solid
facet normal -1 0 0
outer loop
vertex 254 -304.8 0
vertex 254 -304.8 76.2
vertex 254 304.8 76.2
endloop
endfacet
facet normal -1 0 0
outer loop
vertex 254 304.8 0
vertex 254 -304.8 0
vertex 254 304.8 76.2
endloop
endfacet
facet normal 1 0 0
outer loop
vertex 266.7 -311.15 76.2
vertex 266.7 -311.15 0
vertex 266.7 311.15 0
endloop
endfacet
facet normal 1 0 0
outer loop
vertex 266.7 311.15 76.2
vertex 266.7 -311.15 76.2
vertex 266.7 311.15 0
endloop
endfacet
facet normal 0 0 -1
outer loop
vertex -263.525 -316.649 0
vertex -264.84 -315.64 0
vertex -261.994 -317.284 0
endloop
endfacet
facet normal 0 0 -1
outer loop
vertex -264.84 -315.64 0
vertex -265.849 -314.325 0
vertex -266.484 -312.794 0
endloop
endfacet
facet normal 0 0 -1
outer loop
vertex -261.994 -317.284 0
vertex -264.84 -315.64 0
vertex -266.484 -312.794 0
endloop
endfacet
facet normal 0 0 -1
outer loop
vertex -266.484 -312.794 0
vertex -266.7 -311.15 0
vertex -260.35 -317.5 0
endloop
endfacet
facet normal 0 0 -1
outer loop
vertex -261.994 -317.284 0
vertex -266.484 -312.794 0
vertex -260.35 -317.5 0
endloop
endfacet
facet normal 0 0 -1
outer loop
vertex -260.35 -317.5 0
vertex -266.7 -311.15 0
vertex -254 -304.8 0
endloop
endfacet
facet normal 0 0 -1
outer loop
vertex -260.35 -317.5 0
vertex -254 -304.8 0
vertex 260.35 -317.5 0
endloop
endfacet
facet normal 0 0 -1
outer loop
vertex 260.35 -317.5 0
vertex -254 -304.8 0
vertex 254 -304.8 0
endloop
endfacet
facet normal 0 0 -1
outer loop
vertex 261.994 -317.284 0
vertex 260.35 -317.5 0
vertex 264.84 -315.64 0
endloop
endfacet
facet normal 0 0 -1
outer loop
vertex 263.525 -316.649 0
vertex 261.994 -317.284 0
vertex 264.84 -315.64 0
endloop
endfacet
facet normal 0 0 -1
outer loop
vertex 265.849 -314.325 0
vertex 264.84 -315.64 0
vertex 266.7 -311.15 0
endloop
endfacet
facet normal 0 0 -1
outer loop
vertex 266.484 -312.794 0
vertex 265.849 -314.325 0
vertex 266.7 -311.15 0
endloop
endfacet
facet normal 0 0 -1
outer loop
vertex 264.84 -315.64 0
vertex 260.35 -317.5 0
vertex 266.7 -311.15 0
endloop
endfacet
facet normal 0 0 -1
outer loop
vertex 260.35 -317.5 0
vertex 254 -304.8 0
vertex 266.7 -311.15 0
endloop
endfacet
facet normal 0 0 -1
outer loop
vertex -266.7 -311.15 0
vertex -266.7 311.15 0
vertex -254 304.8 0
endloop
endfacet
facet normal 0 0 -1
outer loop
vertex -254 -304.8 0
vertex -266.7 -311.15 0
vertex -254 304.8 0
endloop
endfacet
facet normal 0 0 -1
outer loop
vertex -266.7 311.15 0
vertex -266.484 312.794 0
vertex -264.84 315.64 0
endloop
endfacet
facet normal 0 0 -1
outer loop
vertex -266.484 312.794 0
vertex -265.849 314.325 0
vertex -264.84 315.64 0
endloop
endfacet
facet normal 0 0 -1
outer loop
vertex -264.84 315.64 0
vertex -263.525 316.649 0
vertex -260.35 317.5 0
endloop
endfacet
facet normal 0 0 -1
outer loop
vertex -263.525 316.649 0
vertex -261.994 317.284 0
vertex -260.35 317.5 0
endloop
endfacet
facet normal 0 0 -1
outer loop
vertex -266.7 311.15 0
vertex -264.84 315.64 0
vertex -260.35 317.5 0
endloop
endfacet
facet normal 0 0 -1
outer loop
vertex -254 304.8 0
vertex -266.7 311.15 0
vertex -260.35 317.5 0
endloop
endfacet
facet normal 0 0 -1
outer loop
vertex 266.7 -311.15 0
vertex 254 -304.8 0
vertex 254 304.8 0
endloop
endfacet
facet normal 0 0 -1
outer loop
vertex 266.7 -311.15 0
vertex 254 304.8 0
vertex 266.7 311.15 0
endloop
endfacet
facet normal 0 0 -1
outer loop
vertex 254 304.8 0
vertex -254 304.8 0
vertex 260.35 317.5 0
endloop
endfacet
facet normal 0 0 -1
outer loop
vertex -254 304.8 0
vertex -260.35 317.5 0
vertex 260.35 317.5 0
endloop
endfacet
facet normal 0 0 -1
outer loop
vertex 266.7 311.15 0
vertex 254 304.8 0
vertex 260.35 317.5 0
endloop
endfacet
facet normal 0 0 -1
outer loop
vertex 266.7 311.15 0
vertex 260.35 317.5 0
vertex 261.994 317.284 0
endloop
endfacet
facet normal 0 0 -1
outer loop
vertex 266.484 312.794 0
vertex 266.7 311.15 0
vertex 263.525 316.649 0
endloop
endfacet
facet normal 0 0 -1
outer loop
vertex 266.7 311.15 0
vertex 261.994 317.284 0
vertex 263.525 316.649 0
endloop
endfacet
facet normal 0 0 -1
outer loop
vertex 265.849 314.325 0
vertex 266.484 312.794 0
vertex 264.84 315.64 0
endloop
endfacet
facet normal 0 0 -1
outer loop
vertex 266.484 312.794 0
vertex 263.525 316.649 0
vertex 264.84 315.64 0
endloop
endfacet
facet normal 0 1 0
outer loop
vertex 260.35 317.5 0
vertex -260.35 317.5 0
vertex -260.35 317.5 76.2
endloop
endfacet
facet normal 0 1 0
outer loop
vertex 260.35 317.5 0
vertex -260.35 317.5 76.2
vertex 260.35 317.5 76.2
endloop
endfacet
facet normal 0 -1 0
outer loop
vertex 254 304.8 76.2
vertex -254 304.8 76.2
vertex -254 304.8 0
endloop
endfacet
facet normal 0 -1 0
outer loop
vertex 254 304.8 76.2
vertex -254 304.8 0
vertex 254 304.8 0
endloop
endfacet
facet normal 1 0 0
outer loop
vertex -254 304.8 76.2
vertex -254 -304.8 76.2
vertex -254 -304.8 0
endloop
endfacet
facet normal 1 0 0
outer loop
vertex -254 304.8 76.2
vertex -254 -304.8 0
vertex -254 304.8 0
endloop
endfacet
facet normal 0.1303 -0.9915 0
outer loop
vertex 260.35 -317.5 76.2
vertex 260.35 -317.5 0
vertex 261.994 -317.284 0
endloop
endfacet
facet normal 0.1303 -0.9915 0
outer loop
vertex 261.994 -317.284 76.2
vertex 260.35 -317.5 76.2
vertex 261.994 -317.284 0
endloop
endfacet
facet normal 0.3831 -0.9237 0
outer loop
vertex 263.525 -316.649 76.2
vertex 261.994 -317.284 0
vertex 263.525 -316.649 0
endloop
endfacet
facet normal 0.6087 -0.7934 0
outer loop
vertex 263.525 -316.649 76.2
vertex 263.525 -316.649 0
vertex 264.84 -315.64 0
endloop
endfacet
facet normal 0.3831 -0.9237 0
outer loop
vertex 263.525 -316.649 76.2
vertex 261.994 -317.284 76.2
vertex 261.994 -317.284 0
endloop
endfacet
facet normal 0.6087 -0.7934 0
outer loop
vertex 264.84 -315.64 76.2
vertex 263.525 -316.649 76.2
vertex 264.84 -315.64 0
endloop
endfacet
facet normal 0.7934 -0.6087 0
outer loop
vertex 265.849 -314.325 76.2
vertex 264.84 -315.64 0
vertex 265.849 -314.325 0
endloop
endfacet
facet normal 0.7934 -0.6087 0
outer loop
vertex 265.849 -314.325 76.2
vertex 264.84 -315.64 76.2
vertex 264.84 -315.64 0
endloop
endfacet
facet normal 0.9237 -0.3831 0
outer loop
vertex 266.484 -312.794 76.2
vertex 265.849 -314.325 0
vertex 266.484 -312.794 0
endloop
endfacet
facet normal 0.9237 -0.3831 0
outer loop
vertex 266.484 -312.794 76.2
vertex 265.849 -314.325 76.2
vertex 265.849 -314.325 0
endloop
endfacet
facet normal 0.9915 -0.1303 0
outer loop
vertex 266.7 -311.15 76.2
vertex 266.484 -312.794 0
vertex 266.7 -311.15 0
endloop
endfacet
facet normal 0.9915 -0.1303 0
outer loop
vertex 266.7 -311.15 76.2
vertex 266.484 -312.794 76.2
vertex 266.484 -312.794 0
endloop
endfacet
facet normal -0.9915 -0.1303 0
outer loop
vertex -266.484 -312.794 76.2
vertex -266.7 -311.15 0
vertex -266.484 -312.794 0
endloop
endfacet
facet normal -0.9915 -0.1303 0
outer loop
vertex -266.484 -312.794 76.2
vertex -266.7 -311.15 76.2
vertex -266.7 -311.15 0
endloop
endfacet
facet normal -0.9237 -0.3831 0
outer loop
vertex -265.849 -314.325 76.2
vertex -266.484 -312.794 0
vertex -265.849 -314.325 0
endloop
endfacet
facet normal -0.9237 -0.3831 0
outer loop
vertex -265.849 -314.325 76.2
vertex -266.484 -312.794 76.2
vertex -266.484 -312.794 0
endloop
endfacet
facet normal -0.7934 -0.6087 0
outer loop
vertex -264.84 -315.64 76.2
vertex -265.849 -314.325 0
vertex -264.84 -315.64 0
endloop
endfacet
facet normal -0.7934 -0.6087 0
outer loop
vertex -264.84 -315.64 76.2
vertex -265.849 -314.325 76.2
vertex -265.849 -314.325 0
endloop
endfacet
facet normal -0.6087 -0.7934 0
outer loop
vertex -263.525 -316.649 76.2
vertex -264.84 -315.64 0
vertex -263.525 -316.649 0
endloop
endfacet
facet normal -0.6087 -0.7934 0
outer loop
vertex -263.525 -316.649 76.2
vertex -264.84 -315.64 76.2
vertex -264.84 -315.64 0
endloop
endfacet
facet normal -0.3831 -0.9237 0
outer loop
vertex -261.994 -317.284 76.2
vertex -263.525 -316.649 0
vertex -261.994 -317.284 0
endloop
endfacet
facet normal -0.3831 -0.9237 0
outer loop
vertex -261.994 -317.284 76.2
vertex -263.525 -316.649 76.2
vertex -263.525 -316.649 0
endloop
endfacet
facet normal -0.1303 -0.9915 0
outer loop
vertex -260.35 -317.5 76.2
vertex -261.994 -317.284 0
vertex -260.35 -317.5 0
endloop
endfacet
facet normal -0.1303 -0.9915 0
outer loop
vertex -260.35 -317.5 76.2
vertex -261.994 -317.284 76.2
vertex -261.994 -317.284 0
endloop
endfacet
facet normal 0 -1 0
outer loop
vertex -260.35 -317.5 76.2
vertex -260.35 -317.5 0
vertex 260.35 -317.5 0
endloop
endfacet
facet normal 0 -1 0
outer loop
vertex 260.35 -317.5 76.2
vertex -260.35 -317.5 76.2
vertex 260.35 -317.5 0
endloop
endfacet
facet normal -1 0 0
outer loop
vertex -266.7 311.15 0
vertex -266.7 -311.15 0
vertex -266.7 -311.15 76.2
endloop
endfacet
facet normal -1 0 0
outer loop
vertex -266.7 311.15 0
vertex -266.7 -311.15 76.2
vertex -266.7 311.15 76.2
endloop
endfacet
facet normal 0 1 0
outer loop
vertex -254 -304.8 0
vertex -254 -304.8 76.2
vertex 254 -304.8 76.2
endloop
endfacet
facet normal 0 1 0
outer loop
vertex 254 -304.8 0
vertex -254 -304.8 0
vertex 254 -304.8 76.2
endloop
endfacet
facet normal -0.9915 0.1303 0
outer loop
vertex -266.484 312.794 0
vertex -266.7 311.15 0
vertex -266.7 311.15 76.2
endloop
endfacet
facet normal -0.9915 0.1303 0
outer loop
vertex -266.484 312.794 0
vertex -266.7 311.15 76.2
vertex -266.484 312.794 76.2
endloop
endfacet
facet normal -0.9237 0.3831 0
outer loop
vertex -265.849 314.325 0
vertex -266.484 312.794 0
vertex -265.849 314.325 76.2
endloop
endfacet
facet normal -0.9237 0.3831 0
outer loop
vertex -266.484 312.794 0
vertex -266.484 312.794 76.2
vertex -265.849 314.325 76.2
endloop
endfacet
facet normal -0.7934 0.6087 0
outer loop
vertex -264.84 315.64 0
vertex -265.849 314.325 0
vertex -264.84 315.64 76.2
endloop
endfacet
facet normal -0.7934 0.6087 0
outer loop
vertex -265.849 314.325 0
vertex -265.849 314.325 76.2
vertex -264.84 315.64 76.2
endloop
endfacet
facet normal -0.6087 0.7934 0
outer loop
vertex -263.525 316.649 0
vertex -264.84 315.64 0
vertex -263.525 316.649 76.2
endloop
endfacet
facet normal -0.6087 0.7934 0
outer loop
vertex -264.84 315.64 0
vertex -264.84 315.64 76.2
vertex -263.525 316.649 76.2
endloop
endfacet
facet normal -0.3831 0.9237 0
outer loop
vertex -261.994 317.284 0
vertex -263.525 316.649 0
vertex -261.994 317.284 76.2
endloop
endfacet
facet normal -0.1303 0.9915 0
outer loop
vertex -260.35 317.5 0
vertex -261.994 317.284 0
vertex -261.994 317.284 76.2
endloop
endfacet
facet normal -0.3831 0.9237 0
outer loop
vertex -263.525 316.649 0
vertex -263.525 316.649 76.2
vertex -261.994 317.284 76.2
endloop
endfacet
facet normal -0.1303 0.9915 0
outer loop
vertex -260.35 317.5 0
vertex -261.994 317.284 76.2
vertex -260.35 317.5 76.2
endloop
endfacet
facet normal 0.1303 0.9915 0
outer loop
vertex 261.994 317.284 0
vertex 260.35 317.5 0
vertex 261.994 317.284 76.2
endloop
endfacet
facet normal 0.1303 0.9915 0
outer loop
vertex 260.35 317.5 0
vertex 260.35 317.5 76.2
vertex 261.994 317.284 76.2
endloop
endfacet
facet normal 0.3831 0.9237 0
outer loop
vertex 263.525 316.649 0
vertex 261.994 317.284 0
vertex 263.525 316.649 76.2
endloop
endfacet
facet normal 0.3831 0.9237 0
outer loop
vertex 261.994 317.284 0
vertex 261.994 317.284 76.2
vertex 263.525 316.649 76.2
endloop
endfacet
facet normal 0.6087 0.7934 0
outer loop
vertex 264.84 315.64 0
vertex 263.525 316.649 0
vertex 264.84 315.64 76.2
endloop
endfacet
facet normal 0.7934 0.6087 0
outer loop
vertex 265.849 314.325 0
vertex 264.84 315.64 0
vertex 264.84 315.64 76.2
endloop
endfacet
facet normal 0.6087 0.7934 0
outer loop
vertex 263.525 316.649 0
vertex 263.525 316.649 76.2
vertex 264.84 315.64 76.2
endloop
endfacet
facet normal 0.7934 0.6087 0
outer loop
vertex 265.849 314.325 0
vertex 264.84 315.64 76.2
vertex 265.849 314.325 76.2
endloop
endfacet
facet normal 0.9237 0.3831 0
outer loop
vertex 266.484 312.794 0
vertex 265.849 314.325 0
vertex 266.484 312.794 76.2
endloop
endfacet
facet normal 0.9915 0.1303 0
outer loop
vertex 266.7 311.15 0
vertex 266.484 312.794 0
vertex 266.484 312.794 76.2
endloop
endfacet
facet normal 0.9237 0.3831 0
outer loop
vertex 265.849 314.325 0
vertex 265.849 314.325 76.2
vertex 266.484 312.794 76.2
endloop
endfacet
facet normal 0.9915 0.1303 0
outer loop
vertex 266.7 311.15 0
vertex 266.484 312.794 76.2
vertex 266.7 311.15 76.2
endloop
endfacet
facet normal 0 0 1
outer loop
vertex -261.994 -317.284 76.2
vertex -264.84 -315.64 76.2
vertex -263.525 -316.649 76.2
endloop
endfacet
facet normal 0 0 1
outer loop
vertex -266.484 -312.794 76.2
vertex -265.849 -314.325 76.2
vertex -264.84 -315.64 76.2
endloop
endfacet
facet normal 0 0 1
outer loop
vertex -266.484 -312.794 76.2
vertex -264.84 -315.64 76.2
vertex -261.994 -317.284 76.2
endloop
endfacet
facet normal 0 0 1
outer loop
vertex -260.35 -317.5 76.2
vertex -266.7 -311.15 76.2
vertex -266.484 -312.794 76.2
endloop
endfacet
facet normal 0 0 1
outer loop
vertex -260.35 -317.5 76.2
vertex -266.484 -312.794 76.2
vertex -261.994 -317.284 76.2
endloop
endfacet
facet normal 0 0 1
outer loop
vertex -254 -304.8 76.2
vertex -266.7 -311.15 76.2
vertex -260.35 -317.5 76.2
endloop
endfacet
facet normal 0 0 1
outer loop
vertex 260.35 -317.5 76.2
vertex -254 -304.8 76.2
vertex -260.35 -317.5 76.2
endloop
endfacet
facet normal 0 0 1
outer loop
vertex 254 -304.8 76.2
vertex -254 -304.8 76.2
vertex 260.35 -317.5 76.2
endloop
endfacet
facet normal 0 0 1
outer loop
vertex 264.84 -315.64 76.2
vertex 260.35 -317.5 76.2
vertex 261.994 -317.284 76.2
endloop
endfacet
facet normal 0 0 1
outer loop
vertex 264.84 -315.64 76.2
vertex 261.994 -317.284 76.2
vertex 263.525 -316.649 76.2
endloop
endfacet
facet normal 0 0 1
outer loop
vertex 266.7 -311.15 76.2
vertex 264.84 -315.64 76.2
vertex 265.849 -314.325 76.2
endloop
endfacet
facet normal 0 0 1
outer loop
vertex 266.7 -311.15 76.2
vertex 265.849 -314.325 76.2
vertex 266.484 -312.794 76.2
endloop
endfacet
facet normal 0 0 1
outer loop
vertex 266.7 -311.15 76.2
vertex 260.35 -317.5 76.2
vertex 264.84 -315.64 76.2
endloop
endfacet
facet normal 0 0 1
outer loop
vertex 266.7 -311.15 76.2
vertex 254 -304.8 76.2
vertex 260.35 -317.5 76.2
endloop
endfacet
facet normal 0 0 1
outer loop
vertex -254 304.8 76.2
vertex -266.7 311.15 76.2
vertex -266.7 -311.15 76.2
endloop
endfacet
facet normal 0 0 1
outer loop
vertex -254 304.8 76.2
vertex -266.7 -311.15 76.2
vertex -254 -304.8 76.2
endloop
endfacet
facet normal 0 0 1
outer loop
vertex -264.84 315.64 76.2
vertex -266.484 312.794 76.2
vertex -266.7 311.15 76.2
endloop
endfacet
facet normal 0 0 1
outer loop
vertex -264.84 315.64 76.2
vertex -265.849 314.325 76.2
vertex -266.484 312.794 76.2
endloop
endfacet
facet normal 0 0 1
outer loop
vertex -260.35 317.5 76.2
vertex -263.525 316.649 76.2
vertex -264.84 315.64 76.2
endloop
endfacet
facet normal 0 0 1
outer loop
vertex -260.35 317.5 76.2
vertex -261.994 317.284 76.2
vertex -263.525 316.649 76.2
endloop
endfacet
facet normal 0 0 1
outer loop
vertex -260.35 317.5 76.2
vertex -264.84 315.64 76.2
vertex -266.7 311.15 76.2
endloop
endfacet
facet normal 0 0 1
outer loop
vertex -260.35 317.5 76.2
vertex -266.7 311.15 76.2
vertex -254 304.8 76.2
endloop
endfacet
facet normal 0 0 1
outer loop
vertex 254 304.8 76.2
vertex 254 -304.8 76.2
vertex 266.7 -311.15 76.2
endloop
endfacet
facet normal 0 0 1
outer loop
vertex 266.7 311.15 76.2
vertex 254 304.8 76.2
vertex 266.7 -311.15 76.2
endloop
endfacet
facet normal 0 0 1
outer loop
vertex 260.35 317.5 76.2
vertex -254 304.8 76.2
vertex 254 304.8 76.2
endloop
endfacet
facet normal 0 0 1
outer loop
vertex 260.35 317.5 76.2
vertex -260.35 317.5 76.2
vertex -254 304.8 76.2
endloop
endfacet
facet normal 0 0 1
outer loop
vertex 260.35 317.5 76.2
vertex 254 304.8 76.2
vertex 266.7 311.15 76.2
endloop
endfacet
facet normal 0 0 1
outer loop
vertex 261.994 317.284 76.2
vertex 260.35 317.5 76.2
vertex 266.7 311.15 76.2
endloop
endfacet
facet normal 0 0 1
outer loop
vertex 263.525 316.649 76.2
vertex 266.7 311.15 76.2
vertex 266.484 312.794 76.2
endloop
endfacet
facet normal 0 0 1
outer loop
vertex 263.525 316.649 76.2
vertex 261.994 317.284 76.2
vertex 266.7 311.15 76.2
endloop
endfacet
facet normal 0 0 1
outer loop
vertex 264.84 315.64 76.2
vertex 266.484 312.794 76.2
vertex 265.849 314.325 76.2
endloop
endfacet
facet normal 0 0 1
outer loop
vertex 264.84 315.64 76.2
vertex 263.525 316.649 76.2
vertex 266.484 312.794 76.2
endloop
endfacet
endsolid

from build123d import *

# Parameters (mm, degrees)
SKETCH1_W           = 533.4
SKETCH1_H           = 635
BOSS_EXTRUDE1_DEPTH = 76.2
SKETCH2_W           = 508
SKETCH2_H           = 609.6
CUT_EXTRUDE1_DEPTH  = 422.594093887
FILLET1_R           = 6.35


with BuildPart() as part:
    # Sketch1 → Boss-Extrude1 (new body)
    with BuildSketch(Plane.XY):
        Rectangle(SKETCH1_W, SKETCH1_H)
    extrude(amount=BOSS_EXTRUDE1_DEPTH)

    # Sketch2 → Cut-Extrude1 (cut, through all)
    with BuildSketch(Plane.XY.offset(76.2)):
        Rectangle(SKETCH2_W, SKETCH2_H)
    extrude(amount=-CUT_EXTRUDE1_DEPTH, mode=Mode.SUBTRACT)

    # Fillet1
    fillet1_edges = [part.edges().sort_by_distance(p)[0] for p in [
        (266.7, -317.5, 38.1),
        (-266.7, -317.5, 38.1),
        (-266.7, 317.5, 38.1),
        (266.7, 317.5, 38.1),
    ]]
    fillet(fillet1_edges, radius=FILLET1_R)


solid = part.part
